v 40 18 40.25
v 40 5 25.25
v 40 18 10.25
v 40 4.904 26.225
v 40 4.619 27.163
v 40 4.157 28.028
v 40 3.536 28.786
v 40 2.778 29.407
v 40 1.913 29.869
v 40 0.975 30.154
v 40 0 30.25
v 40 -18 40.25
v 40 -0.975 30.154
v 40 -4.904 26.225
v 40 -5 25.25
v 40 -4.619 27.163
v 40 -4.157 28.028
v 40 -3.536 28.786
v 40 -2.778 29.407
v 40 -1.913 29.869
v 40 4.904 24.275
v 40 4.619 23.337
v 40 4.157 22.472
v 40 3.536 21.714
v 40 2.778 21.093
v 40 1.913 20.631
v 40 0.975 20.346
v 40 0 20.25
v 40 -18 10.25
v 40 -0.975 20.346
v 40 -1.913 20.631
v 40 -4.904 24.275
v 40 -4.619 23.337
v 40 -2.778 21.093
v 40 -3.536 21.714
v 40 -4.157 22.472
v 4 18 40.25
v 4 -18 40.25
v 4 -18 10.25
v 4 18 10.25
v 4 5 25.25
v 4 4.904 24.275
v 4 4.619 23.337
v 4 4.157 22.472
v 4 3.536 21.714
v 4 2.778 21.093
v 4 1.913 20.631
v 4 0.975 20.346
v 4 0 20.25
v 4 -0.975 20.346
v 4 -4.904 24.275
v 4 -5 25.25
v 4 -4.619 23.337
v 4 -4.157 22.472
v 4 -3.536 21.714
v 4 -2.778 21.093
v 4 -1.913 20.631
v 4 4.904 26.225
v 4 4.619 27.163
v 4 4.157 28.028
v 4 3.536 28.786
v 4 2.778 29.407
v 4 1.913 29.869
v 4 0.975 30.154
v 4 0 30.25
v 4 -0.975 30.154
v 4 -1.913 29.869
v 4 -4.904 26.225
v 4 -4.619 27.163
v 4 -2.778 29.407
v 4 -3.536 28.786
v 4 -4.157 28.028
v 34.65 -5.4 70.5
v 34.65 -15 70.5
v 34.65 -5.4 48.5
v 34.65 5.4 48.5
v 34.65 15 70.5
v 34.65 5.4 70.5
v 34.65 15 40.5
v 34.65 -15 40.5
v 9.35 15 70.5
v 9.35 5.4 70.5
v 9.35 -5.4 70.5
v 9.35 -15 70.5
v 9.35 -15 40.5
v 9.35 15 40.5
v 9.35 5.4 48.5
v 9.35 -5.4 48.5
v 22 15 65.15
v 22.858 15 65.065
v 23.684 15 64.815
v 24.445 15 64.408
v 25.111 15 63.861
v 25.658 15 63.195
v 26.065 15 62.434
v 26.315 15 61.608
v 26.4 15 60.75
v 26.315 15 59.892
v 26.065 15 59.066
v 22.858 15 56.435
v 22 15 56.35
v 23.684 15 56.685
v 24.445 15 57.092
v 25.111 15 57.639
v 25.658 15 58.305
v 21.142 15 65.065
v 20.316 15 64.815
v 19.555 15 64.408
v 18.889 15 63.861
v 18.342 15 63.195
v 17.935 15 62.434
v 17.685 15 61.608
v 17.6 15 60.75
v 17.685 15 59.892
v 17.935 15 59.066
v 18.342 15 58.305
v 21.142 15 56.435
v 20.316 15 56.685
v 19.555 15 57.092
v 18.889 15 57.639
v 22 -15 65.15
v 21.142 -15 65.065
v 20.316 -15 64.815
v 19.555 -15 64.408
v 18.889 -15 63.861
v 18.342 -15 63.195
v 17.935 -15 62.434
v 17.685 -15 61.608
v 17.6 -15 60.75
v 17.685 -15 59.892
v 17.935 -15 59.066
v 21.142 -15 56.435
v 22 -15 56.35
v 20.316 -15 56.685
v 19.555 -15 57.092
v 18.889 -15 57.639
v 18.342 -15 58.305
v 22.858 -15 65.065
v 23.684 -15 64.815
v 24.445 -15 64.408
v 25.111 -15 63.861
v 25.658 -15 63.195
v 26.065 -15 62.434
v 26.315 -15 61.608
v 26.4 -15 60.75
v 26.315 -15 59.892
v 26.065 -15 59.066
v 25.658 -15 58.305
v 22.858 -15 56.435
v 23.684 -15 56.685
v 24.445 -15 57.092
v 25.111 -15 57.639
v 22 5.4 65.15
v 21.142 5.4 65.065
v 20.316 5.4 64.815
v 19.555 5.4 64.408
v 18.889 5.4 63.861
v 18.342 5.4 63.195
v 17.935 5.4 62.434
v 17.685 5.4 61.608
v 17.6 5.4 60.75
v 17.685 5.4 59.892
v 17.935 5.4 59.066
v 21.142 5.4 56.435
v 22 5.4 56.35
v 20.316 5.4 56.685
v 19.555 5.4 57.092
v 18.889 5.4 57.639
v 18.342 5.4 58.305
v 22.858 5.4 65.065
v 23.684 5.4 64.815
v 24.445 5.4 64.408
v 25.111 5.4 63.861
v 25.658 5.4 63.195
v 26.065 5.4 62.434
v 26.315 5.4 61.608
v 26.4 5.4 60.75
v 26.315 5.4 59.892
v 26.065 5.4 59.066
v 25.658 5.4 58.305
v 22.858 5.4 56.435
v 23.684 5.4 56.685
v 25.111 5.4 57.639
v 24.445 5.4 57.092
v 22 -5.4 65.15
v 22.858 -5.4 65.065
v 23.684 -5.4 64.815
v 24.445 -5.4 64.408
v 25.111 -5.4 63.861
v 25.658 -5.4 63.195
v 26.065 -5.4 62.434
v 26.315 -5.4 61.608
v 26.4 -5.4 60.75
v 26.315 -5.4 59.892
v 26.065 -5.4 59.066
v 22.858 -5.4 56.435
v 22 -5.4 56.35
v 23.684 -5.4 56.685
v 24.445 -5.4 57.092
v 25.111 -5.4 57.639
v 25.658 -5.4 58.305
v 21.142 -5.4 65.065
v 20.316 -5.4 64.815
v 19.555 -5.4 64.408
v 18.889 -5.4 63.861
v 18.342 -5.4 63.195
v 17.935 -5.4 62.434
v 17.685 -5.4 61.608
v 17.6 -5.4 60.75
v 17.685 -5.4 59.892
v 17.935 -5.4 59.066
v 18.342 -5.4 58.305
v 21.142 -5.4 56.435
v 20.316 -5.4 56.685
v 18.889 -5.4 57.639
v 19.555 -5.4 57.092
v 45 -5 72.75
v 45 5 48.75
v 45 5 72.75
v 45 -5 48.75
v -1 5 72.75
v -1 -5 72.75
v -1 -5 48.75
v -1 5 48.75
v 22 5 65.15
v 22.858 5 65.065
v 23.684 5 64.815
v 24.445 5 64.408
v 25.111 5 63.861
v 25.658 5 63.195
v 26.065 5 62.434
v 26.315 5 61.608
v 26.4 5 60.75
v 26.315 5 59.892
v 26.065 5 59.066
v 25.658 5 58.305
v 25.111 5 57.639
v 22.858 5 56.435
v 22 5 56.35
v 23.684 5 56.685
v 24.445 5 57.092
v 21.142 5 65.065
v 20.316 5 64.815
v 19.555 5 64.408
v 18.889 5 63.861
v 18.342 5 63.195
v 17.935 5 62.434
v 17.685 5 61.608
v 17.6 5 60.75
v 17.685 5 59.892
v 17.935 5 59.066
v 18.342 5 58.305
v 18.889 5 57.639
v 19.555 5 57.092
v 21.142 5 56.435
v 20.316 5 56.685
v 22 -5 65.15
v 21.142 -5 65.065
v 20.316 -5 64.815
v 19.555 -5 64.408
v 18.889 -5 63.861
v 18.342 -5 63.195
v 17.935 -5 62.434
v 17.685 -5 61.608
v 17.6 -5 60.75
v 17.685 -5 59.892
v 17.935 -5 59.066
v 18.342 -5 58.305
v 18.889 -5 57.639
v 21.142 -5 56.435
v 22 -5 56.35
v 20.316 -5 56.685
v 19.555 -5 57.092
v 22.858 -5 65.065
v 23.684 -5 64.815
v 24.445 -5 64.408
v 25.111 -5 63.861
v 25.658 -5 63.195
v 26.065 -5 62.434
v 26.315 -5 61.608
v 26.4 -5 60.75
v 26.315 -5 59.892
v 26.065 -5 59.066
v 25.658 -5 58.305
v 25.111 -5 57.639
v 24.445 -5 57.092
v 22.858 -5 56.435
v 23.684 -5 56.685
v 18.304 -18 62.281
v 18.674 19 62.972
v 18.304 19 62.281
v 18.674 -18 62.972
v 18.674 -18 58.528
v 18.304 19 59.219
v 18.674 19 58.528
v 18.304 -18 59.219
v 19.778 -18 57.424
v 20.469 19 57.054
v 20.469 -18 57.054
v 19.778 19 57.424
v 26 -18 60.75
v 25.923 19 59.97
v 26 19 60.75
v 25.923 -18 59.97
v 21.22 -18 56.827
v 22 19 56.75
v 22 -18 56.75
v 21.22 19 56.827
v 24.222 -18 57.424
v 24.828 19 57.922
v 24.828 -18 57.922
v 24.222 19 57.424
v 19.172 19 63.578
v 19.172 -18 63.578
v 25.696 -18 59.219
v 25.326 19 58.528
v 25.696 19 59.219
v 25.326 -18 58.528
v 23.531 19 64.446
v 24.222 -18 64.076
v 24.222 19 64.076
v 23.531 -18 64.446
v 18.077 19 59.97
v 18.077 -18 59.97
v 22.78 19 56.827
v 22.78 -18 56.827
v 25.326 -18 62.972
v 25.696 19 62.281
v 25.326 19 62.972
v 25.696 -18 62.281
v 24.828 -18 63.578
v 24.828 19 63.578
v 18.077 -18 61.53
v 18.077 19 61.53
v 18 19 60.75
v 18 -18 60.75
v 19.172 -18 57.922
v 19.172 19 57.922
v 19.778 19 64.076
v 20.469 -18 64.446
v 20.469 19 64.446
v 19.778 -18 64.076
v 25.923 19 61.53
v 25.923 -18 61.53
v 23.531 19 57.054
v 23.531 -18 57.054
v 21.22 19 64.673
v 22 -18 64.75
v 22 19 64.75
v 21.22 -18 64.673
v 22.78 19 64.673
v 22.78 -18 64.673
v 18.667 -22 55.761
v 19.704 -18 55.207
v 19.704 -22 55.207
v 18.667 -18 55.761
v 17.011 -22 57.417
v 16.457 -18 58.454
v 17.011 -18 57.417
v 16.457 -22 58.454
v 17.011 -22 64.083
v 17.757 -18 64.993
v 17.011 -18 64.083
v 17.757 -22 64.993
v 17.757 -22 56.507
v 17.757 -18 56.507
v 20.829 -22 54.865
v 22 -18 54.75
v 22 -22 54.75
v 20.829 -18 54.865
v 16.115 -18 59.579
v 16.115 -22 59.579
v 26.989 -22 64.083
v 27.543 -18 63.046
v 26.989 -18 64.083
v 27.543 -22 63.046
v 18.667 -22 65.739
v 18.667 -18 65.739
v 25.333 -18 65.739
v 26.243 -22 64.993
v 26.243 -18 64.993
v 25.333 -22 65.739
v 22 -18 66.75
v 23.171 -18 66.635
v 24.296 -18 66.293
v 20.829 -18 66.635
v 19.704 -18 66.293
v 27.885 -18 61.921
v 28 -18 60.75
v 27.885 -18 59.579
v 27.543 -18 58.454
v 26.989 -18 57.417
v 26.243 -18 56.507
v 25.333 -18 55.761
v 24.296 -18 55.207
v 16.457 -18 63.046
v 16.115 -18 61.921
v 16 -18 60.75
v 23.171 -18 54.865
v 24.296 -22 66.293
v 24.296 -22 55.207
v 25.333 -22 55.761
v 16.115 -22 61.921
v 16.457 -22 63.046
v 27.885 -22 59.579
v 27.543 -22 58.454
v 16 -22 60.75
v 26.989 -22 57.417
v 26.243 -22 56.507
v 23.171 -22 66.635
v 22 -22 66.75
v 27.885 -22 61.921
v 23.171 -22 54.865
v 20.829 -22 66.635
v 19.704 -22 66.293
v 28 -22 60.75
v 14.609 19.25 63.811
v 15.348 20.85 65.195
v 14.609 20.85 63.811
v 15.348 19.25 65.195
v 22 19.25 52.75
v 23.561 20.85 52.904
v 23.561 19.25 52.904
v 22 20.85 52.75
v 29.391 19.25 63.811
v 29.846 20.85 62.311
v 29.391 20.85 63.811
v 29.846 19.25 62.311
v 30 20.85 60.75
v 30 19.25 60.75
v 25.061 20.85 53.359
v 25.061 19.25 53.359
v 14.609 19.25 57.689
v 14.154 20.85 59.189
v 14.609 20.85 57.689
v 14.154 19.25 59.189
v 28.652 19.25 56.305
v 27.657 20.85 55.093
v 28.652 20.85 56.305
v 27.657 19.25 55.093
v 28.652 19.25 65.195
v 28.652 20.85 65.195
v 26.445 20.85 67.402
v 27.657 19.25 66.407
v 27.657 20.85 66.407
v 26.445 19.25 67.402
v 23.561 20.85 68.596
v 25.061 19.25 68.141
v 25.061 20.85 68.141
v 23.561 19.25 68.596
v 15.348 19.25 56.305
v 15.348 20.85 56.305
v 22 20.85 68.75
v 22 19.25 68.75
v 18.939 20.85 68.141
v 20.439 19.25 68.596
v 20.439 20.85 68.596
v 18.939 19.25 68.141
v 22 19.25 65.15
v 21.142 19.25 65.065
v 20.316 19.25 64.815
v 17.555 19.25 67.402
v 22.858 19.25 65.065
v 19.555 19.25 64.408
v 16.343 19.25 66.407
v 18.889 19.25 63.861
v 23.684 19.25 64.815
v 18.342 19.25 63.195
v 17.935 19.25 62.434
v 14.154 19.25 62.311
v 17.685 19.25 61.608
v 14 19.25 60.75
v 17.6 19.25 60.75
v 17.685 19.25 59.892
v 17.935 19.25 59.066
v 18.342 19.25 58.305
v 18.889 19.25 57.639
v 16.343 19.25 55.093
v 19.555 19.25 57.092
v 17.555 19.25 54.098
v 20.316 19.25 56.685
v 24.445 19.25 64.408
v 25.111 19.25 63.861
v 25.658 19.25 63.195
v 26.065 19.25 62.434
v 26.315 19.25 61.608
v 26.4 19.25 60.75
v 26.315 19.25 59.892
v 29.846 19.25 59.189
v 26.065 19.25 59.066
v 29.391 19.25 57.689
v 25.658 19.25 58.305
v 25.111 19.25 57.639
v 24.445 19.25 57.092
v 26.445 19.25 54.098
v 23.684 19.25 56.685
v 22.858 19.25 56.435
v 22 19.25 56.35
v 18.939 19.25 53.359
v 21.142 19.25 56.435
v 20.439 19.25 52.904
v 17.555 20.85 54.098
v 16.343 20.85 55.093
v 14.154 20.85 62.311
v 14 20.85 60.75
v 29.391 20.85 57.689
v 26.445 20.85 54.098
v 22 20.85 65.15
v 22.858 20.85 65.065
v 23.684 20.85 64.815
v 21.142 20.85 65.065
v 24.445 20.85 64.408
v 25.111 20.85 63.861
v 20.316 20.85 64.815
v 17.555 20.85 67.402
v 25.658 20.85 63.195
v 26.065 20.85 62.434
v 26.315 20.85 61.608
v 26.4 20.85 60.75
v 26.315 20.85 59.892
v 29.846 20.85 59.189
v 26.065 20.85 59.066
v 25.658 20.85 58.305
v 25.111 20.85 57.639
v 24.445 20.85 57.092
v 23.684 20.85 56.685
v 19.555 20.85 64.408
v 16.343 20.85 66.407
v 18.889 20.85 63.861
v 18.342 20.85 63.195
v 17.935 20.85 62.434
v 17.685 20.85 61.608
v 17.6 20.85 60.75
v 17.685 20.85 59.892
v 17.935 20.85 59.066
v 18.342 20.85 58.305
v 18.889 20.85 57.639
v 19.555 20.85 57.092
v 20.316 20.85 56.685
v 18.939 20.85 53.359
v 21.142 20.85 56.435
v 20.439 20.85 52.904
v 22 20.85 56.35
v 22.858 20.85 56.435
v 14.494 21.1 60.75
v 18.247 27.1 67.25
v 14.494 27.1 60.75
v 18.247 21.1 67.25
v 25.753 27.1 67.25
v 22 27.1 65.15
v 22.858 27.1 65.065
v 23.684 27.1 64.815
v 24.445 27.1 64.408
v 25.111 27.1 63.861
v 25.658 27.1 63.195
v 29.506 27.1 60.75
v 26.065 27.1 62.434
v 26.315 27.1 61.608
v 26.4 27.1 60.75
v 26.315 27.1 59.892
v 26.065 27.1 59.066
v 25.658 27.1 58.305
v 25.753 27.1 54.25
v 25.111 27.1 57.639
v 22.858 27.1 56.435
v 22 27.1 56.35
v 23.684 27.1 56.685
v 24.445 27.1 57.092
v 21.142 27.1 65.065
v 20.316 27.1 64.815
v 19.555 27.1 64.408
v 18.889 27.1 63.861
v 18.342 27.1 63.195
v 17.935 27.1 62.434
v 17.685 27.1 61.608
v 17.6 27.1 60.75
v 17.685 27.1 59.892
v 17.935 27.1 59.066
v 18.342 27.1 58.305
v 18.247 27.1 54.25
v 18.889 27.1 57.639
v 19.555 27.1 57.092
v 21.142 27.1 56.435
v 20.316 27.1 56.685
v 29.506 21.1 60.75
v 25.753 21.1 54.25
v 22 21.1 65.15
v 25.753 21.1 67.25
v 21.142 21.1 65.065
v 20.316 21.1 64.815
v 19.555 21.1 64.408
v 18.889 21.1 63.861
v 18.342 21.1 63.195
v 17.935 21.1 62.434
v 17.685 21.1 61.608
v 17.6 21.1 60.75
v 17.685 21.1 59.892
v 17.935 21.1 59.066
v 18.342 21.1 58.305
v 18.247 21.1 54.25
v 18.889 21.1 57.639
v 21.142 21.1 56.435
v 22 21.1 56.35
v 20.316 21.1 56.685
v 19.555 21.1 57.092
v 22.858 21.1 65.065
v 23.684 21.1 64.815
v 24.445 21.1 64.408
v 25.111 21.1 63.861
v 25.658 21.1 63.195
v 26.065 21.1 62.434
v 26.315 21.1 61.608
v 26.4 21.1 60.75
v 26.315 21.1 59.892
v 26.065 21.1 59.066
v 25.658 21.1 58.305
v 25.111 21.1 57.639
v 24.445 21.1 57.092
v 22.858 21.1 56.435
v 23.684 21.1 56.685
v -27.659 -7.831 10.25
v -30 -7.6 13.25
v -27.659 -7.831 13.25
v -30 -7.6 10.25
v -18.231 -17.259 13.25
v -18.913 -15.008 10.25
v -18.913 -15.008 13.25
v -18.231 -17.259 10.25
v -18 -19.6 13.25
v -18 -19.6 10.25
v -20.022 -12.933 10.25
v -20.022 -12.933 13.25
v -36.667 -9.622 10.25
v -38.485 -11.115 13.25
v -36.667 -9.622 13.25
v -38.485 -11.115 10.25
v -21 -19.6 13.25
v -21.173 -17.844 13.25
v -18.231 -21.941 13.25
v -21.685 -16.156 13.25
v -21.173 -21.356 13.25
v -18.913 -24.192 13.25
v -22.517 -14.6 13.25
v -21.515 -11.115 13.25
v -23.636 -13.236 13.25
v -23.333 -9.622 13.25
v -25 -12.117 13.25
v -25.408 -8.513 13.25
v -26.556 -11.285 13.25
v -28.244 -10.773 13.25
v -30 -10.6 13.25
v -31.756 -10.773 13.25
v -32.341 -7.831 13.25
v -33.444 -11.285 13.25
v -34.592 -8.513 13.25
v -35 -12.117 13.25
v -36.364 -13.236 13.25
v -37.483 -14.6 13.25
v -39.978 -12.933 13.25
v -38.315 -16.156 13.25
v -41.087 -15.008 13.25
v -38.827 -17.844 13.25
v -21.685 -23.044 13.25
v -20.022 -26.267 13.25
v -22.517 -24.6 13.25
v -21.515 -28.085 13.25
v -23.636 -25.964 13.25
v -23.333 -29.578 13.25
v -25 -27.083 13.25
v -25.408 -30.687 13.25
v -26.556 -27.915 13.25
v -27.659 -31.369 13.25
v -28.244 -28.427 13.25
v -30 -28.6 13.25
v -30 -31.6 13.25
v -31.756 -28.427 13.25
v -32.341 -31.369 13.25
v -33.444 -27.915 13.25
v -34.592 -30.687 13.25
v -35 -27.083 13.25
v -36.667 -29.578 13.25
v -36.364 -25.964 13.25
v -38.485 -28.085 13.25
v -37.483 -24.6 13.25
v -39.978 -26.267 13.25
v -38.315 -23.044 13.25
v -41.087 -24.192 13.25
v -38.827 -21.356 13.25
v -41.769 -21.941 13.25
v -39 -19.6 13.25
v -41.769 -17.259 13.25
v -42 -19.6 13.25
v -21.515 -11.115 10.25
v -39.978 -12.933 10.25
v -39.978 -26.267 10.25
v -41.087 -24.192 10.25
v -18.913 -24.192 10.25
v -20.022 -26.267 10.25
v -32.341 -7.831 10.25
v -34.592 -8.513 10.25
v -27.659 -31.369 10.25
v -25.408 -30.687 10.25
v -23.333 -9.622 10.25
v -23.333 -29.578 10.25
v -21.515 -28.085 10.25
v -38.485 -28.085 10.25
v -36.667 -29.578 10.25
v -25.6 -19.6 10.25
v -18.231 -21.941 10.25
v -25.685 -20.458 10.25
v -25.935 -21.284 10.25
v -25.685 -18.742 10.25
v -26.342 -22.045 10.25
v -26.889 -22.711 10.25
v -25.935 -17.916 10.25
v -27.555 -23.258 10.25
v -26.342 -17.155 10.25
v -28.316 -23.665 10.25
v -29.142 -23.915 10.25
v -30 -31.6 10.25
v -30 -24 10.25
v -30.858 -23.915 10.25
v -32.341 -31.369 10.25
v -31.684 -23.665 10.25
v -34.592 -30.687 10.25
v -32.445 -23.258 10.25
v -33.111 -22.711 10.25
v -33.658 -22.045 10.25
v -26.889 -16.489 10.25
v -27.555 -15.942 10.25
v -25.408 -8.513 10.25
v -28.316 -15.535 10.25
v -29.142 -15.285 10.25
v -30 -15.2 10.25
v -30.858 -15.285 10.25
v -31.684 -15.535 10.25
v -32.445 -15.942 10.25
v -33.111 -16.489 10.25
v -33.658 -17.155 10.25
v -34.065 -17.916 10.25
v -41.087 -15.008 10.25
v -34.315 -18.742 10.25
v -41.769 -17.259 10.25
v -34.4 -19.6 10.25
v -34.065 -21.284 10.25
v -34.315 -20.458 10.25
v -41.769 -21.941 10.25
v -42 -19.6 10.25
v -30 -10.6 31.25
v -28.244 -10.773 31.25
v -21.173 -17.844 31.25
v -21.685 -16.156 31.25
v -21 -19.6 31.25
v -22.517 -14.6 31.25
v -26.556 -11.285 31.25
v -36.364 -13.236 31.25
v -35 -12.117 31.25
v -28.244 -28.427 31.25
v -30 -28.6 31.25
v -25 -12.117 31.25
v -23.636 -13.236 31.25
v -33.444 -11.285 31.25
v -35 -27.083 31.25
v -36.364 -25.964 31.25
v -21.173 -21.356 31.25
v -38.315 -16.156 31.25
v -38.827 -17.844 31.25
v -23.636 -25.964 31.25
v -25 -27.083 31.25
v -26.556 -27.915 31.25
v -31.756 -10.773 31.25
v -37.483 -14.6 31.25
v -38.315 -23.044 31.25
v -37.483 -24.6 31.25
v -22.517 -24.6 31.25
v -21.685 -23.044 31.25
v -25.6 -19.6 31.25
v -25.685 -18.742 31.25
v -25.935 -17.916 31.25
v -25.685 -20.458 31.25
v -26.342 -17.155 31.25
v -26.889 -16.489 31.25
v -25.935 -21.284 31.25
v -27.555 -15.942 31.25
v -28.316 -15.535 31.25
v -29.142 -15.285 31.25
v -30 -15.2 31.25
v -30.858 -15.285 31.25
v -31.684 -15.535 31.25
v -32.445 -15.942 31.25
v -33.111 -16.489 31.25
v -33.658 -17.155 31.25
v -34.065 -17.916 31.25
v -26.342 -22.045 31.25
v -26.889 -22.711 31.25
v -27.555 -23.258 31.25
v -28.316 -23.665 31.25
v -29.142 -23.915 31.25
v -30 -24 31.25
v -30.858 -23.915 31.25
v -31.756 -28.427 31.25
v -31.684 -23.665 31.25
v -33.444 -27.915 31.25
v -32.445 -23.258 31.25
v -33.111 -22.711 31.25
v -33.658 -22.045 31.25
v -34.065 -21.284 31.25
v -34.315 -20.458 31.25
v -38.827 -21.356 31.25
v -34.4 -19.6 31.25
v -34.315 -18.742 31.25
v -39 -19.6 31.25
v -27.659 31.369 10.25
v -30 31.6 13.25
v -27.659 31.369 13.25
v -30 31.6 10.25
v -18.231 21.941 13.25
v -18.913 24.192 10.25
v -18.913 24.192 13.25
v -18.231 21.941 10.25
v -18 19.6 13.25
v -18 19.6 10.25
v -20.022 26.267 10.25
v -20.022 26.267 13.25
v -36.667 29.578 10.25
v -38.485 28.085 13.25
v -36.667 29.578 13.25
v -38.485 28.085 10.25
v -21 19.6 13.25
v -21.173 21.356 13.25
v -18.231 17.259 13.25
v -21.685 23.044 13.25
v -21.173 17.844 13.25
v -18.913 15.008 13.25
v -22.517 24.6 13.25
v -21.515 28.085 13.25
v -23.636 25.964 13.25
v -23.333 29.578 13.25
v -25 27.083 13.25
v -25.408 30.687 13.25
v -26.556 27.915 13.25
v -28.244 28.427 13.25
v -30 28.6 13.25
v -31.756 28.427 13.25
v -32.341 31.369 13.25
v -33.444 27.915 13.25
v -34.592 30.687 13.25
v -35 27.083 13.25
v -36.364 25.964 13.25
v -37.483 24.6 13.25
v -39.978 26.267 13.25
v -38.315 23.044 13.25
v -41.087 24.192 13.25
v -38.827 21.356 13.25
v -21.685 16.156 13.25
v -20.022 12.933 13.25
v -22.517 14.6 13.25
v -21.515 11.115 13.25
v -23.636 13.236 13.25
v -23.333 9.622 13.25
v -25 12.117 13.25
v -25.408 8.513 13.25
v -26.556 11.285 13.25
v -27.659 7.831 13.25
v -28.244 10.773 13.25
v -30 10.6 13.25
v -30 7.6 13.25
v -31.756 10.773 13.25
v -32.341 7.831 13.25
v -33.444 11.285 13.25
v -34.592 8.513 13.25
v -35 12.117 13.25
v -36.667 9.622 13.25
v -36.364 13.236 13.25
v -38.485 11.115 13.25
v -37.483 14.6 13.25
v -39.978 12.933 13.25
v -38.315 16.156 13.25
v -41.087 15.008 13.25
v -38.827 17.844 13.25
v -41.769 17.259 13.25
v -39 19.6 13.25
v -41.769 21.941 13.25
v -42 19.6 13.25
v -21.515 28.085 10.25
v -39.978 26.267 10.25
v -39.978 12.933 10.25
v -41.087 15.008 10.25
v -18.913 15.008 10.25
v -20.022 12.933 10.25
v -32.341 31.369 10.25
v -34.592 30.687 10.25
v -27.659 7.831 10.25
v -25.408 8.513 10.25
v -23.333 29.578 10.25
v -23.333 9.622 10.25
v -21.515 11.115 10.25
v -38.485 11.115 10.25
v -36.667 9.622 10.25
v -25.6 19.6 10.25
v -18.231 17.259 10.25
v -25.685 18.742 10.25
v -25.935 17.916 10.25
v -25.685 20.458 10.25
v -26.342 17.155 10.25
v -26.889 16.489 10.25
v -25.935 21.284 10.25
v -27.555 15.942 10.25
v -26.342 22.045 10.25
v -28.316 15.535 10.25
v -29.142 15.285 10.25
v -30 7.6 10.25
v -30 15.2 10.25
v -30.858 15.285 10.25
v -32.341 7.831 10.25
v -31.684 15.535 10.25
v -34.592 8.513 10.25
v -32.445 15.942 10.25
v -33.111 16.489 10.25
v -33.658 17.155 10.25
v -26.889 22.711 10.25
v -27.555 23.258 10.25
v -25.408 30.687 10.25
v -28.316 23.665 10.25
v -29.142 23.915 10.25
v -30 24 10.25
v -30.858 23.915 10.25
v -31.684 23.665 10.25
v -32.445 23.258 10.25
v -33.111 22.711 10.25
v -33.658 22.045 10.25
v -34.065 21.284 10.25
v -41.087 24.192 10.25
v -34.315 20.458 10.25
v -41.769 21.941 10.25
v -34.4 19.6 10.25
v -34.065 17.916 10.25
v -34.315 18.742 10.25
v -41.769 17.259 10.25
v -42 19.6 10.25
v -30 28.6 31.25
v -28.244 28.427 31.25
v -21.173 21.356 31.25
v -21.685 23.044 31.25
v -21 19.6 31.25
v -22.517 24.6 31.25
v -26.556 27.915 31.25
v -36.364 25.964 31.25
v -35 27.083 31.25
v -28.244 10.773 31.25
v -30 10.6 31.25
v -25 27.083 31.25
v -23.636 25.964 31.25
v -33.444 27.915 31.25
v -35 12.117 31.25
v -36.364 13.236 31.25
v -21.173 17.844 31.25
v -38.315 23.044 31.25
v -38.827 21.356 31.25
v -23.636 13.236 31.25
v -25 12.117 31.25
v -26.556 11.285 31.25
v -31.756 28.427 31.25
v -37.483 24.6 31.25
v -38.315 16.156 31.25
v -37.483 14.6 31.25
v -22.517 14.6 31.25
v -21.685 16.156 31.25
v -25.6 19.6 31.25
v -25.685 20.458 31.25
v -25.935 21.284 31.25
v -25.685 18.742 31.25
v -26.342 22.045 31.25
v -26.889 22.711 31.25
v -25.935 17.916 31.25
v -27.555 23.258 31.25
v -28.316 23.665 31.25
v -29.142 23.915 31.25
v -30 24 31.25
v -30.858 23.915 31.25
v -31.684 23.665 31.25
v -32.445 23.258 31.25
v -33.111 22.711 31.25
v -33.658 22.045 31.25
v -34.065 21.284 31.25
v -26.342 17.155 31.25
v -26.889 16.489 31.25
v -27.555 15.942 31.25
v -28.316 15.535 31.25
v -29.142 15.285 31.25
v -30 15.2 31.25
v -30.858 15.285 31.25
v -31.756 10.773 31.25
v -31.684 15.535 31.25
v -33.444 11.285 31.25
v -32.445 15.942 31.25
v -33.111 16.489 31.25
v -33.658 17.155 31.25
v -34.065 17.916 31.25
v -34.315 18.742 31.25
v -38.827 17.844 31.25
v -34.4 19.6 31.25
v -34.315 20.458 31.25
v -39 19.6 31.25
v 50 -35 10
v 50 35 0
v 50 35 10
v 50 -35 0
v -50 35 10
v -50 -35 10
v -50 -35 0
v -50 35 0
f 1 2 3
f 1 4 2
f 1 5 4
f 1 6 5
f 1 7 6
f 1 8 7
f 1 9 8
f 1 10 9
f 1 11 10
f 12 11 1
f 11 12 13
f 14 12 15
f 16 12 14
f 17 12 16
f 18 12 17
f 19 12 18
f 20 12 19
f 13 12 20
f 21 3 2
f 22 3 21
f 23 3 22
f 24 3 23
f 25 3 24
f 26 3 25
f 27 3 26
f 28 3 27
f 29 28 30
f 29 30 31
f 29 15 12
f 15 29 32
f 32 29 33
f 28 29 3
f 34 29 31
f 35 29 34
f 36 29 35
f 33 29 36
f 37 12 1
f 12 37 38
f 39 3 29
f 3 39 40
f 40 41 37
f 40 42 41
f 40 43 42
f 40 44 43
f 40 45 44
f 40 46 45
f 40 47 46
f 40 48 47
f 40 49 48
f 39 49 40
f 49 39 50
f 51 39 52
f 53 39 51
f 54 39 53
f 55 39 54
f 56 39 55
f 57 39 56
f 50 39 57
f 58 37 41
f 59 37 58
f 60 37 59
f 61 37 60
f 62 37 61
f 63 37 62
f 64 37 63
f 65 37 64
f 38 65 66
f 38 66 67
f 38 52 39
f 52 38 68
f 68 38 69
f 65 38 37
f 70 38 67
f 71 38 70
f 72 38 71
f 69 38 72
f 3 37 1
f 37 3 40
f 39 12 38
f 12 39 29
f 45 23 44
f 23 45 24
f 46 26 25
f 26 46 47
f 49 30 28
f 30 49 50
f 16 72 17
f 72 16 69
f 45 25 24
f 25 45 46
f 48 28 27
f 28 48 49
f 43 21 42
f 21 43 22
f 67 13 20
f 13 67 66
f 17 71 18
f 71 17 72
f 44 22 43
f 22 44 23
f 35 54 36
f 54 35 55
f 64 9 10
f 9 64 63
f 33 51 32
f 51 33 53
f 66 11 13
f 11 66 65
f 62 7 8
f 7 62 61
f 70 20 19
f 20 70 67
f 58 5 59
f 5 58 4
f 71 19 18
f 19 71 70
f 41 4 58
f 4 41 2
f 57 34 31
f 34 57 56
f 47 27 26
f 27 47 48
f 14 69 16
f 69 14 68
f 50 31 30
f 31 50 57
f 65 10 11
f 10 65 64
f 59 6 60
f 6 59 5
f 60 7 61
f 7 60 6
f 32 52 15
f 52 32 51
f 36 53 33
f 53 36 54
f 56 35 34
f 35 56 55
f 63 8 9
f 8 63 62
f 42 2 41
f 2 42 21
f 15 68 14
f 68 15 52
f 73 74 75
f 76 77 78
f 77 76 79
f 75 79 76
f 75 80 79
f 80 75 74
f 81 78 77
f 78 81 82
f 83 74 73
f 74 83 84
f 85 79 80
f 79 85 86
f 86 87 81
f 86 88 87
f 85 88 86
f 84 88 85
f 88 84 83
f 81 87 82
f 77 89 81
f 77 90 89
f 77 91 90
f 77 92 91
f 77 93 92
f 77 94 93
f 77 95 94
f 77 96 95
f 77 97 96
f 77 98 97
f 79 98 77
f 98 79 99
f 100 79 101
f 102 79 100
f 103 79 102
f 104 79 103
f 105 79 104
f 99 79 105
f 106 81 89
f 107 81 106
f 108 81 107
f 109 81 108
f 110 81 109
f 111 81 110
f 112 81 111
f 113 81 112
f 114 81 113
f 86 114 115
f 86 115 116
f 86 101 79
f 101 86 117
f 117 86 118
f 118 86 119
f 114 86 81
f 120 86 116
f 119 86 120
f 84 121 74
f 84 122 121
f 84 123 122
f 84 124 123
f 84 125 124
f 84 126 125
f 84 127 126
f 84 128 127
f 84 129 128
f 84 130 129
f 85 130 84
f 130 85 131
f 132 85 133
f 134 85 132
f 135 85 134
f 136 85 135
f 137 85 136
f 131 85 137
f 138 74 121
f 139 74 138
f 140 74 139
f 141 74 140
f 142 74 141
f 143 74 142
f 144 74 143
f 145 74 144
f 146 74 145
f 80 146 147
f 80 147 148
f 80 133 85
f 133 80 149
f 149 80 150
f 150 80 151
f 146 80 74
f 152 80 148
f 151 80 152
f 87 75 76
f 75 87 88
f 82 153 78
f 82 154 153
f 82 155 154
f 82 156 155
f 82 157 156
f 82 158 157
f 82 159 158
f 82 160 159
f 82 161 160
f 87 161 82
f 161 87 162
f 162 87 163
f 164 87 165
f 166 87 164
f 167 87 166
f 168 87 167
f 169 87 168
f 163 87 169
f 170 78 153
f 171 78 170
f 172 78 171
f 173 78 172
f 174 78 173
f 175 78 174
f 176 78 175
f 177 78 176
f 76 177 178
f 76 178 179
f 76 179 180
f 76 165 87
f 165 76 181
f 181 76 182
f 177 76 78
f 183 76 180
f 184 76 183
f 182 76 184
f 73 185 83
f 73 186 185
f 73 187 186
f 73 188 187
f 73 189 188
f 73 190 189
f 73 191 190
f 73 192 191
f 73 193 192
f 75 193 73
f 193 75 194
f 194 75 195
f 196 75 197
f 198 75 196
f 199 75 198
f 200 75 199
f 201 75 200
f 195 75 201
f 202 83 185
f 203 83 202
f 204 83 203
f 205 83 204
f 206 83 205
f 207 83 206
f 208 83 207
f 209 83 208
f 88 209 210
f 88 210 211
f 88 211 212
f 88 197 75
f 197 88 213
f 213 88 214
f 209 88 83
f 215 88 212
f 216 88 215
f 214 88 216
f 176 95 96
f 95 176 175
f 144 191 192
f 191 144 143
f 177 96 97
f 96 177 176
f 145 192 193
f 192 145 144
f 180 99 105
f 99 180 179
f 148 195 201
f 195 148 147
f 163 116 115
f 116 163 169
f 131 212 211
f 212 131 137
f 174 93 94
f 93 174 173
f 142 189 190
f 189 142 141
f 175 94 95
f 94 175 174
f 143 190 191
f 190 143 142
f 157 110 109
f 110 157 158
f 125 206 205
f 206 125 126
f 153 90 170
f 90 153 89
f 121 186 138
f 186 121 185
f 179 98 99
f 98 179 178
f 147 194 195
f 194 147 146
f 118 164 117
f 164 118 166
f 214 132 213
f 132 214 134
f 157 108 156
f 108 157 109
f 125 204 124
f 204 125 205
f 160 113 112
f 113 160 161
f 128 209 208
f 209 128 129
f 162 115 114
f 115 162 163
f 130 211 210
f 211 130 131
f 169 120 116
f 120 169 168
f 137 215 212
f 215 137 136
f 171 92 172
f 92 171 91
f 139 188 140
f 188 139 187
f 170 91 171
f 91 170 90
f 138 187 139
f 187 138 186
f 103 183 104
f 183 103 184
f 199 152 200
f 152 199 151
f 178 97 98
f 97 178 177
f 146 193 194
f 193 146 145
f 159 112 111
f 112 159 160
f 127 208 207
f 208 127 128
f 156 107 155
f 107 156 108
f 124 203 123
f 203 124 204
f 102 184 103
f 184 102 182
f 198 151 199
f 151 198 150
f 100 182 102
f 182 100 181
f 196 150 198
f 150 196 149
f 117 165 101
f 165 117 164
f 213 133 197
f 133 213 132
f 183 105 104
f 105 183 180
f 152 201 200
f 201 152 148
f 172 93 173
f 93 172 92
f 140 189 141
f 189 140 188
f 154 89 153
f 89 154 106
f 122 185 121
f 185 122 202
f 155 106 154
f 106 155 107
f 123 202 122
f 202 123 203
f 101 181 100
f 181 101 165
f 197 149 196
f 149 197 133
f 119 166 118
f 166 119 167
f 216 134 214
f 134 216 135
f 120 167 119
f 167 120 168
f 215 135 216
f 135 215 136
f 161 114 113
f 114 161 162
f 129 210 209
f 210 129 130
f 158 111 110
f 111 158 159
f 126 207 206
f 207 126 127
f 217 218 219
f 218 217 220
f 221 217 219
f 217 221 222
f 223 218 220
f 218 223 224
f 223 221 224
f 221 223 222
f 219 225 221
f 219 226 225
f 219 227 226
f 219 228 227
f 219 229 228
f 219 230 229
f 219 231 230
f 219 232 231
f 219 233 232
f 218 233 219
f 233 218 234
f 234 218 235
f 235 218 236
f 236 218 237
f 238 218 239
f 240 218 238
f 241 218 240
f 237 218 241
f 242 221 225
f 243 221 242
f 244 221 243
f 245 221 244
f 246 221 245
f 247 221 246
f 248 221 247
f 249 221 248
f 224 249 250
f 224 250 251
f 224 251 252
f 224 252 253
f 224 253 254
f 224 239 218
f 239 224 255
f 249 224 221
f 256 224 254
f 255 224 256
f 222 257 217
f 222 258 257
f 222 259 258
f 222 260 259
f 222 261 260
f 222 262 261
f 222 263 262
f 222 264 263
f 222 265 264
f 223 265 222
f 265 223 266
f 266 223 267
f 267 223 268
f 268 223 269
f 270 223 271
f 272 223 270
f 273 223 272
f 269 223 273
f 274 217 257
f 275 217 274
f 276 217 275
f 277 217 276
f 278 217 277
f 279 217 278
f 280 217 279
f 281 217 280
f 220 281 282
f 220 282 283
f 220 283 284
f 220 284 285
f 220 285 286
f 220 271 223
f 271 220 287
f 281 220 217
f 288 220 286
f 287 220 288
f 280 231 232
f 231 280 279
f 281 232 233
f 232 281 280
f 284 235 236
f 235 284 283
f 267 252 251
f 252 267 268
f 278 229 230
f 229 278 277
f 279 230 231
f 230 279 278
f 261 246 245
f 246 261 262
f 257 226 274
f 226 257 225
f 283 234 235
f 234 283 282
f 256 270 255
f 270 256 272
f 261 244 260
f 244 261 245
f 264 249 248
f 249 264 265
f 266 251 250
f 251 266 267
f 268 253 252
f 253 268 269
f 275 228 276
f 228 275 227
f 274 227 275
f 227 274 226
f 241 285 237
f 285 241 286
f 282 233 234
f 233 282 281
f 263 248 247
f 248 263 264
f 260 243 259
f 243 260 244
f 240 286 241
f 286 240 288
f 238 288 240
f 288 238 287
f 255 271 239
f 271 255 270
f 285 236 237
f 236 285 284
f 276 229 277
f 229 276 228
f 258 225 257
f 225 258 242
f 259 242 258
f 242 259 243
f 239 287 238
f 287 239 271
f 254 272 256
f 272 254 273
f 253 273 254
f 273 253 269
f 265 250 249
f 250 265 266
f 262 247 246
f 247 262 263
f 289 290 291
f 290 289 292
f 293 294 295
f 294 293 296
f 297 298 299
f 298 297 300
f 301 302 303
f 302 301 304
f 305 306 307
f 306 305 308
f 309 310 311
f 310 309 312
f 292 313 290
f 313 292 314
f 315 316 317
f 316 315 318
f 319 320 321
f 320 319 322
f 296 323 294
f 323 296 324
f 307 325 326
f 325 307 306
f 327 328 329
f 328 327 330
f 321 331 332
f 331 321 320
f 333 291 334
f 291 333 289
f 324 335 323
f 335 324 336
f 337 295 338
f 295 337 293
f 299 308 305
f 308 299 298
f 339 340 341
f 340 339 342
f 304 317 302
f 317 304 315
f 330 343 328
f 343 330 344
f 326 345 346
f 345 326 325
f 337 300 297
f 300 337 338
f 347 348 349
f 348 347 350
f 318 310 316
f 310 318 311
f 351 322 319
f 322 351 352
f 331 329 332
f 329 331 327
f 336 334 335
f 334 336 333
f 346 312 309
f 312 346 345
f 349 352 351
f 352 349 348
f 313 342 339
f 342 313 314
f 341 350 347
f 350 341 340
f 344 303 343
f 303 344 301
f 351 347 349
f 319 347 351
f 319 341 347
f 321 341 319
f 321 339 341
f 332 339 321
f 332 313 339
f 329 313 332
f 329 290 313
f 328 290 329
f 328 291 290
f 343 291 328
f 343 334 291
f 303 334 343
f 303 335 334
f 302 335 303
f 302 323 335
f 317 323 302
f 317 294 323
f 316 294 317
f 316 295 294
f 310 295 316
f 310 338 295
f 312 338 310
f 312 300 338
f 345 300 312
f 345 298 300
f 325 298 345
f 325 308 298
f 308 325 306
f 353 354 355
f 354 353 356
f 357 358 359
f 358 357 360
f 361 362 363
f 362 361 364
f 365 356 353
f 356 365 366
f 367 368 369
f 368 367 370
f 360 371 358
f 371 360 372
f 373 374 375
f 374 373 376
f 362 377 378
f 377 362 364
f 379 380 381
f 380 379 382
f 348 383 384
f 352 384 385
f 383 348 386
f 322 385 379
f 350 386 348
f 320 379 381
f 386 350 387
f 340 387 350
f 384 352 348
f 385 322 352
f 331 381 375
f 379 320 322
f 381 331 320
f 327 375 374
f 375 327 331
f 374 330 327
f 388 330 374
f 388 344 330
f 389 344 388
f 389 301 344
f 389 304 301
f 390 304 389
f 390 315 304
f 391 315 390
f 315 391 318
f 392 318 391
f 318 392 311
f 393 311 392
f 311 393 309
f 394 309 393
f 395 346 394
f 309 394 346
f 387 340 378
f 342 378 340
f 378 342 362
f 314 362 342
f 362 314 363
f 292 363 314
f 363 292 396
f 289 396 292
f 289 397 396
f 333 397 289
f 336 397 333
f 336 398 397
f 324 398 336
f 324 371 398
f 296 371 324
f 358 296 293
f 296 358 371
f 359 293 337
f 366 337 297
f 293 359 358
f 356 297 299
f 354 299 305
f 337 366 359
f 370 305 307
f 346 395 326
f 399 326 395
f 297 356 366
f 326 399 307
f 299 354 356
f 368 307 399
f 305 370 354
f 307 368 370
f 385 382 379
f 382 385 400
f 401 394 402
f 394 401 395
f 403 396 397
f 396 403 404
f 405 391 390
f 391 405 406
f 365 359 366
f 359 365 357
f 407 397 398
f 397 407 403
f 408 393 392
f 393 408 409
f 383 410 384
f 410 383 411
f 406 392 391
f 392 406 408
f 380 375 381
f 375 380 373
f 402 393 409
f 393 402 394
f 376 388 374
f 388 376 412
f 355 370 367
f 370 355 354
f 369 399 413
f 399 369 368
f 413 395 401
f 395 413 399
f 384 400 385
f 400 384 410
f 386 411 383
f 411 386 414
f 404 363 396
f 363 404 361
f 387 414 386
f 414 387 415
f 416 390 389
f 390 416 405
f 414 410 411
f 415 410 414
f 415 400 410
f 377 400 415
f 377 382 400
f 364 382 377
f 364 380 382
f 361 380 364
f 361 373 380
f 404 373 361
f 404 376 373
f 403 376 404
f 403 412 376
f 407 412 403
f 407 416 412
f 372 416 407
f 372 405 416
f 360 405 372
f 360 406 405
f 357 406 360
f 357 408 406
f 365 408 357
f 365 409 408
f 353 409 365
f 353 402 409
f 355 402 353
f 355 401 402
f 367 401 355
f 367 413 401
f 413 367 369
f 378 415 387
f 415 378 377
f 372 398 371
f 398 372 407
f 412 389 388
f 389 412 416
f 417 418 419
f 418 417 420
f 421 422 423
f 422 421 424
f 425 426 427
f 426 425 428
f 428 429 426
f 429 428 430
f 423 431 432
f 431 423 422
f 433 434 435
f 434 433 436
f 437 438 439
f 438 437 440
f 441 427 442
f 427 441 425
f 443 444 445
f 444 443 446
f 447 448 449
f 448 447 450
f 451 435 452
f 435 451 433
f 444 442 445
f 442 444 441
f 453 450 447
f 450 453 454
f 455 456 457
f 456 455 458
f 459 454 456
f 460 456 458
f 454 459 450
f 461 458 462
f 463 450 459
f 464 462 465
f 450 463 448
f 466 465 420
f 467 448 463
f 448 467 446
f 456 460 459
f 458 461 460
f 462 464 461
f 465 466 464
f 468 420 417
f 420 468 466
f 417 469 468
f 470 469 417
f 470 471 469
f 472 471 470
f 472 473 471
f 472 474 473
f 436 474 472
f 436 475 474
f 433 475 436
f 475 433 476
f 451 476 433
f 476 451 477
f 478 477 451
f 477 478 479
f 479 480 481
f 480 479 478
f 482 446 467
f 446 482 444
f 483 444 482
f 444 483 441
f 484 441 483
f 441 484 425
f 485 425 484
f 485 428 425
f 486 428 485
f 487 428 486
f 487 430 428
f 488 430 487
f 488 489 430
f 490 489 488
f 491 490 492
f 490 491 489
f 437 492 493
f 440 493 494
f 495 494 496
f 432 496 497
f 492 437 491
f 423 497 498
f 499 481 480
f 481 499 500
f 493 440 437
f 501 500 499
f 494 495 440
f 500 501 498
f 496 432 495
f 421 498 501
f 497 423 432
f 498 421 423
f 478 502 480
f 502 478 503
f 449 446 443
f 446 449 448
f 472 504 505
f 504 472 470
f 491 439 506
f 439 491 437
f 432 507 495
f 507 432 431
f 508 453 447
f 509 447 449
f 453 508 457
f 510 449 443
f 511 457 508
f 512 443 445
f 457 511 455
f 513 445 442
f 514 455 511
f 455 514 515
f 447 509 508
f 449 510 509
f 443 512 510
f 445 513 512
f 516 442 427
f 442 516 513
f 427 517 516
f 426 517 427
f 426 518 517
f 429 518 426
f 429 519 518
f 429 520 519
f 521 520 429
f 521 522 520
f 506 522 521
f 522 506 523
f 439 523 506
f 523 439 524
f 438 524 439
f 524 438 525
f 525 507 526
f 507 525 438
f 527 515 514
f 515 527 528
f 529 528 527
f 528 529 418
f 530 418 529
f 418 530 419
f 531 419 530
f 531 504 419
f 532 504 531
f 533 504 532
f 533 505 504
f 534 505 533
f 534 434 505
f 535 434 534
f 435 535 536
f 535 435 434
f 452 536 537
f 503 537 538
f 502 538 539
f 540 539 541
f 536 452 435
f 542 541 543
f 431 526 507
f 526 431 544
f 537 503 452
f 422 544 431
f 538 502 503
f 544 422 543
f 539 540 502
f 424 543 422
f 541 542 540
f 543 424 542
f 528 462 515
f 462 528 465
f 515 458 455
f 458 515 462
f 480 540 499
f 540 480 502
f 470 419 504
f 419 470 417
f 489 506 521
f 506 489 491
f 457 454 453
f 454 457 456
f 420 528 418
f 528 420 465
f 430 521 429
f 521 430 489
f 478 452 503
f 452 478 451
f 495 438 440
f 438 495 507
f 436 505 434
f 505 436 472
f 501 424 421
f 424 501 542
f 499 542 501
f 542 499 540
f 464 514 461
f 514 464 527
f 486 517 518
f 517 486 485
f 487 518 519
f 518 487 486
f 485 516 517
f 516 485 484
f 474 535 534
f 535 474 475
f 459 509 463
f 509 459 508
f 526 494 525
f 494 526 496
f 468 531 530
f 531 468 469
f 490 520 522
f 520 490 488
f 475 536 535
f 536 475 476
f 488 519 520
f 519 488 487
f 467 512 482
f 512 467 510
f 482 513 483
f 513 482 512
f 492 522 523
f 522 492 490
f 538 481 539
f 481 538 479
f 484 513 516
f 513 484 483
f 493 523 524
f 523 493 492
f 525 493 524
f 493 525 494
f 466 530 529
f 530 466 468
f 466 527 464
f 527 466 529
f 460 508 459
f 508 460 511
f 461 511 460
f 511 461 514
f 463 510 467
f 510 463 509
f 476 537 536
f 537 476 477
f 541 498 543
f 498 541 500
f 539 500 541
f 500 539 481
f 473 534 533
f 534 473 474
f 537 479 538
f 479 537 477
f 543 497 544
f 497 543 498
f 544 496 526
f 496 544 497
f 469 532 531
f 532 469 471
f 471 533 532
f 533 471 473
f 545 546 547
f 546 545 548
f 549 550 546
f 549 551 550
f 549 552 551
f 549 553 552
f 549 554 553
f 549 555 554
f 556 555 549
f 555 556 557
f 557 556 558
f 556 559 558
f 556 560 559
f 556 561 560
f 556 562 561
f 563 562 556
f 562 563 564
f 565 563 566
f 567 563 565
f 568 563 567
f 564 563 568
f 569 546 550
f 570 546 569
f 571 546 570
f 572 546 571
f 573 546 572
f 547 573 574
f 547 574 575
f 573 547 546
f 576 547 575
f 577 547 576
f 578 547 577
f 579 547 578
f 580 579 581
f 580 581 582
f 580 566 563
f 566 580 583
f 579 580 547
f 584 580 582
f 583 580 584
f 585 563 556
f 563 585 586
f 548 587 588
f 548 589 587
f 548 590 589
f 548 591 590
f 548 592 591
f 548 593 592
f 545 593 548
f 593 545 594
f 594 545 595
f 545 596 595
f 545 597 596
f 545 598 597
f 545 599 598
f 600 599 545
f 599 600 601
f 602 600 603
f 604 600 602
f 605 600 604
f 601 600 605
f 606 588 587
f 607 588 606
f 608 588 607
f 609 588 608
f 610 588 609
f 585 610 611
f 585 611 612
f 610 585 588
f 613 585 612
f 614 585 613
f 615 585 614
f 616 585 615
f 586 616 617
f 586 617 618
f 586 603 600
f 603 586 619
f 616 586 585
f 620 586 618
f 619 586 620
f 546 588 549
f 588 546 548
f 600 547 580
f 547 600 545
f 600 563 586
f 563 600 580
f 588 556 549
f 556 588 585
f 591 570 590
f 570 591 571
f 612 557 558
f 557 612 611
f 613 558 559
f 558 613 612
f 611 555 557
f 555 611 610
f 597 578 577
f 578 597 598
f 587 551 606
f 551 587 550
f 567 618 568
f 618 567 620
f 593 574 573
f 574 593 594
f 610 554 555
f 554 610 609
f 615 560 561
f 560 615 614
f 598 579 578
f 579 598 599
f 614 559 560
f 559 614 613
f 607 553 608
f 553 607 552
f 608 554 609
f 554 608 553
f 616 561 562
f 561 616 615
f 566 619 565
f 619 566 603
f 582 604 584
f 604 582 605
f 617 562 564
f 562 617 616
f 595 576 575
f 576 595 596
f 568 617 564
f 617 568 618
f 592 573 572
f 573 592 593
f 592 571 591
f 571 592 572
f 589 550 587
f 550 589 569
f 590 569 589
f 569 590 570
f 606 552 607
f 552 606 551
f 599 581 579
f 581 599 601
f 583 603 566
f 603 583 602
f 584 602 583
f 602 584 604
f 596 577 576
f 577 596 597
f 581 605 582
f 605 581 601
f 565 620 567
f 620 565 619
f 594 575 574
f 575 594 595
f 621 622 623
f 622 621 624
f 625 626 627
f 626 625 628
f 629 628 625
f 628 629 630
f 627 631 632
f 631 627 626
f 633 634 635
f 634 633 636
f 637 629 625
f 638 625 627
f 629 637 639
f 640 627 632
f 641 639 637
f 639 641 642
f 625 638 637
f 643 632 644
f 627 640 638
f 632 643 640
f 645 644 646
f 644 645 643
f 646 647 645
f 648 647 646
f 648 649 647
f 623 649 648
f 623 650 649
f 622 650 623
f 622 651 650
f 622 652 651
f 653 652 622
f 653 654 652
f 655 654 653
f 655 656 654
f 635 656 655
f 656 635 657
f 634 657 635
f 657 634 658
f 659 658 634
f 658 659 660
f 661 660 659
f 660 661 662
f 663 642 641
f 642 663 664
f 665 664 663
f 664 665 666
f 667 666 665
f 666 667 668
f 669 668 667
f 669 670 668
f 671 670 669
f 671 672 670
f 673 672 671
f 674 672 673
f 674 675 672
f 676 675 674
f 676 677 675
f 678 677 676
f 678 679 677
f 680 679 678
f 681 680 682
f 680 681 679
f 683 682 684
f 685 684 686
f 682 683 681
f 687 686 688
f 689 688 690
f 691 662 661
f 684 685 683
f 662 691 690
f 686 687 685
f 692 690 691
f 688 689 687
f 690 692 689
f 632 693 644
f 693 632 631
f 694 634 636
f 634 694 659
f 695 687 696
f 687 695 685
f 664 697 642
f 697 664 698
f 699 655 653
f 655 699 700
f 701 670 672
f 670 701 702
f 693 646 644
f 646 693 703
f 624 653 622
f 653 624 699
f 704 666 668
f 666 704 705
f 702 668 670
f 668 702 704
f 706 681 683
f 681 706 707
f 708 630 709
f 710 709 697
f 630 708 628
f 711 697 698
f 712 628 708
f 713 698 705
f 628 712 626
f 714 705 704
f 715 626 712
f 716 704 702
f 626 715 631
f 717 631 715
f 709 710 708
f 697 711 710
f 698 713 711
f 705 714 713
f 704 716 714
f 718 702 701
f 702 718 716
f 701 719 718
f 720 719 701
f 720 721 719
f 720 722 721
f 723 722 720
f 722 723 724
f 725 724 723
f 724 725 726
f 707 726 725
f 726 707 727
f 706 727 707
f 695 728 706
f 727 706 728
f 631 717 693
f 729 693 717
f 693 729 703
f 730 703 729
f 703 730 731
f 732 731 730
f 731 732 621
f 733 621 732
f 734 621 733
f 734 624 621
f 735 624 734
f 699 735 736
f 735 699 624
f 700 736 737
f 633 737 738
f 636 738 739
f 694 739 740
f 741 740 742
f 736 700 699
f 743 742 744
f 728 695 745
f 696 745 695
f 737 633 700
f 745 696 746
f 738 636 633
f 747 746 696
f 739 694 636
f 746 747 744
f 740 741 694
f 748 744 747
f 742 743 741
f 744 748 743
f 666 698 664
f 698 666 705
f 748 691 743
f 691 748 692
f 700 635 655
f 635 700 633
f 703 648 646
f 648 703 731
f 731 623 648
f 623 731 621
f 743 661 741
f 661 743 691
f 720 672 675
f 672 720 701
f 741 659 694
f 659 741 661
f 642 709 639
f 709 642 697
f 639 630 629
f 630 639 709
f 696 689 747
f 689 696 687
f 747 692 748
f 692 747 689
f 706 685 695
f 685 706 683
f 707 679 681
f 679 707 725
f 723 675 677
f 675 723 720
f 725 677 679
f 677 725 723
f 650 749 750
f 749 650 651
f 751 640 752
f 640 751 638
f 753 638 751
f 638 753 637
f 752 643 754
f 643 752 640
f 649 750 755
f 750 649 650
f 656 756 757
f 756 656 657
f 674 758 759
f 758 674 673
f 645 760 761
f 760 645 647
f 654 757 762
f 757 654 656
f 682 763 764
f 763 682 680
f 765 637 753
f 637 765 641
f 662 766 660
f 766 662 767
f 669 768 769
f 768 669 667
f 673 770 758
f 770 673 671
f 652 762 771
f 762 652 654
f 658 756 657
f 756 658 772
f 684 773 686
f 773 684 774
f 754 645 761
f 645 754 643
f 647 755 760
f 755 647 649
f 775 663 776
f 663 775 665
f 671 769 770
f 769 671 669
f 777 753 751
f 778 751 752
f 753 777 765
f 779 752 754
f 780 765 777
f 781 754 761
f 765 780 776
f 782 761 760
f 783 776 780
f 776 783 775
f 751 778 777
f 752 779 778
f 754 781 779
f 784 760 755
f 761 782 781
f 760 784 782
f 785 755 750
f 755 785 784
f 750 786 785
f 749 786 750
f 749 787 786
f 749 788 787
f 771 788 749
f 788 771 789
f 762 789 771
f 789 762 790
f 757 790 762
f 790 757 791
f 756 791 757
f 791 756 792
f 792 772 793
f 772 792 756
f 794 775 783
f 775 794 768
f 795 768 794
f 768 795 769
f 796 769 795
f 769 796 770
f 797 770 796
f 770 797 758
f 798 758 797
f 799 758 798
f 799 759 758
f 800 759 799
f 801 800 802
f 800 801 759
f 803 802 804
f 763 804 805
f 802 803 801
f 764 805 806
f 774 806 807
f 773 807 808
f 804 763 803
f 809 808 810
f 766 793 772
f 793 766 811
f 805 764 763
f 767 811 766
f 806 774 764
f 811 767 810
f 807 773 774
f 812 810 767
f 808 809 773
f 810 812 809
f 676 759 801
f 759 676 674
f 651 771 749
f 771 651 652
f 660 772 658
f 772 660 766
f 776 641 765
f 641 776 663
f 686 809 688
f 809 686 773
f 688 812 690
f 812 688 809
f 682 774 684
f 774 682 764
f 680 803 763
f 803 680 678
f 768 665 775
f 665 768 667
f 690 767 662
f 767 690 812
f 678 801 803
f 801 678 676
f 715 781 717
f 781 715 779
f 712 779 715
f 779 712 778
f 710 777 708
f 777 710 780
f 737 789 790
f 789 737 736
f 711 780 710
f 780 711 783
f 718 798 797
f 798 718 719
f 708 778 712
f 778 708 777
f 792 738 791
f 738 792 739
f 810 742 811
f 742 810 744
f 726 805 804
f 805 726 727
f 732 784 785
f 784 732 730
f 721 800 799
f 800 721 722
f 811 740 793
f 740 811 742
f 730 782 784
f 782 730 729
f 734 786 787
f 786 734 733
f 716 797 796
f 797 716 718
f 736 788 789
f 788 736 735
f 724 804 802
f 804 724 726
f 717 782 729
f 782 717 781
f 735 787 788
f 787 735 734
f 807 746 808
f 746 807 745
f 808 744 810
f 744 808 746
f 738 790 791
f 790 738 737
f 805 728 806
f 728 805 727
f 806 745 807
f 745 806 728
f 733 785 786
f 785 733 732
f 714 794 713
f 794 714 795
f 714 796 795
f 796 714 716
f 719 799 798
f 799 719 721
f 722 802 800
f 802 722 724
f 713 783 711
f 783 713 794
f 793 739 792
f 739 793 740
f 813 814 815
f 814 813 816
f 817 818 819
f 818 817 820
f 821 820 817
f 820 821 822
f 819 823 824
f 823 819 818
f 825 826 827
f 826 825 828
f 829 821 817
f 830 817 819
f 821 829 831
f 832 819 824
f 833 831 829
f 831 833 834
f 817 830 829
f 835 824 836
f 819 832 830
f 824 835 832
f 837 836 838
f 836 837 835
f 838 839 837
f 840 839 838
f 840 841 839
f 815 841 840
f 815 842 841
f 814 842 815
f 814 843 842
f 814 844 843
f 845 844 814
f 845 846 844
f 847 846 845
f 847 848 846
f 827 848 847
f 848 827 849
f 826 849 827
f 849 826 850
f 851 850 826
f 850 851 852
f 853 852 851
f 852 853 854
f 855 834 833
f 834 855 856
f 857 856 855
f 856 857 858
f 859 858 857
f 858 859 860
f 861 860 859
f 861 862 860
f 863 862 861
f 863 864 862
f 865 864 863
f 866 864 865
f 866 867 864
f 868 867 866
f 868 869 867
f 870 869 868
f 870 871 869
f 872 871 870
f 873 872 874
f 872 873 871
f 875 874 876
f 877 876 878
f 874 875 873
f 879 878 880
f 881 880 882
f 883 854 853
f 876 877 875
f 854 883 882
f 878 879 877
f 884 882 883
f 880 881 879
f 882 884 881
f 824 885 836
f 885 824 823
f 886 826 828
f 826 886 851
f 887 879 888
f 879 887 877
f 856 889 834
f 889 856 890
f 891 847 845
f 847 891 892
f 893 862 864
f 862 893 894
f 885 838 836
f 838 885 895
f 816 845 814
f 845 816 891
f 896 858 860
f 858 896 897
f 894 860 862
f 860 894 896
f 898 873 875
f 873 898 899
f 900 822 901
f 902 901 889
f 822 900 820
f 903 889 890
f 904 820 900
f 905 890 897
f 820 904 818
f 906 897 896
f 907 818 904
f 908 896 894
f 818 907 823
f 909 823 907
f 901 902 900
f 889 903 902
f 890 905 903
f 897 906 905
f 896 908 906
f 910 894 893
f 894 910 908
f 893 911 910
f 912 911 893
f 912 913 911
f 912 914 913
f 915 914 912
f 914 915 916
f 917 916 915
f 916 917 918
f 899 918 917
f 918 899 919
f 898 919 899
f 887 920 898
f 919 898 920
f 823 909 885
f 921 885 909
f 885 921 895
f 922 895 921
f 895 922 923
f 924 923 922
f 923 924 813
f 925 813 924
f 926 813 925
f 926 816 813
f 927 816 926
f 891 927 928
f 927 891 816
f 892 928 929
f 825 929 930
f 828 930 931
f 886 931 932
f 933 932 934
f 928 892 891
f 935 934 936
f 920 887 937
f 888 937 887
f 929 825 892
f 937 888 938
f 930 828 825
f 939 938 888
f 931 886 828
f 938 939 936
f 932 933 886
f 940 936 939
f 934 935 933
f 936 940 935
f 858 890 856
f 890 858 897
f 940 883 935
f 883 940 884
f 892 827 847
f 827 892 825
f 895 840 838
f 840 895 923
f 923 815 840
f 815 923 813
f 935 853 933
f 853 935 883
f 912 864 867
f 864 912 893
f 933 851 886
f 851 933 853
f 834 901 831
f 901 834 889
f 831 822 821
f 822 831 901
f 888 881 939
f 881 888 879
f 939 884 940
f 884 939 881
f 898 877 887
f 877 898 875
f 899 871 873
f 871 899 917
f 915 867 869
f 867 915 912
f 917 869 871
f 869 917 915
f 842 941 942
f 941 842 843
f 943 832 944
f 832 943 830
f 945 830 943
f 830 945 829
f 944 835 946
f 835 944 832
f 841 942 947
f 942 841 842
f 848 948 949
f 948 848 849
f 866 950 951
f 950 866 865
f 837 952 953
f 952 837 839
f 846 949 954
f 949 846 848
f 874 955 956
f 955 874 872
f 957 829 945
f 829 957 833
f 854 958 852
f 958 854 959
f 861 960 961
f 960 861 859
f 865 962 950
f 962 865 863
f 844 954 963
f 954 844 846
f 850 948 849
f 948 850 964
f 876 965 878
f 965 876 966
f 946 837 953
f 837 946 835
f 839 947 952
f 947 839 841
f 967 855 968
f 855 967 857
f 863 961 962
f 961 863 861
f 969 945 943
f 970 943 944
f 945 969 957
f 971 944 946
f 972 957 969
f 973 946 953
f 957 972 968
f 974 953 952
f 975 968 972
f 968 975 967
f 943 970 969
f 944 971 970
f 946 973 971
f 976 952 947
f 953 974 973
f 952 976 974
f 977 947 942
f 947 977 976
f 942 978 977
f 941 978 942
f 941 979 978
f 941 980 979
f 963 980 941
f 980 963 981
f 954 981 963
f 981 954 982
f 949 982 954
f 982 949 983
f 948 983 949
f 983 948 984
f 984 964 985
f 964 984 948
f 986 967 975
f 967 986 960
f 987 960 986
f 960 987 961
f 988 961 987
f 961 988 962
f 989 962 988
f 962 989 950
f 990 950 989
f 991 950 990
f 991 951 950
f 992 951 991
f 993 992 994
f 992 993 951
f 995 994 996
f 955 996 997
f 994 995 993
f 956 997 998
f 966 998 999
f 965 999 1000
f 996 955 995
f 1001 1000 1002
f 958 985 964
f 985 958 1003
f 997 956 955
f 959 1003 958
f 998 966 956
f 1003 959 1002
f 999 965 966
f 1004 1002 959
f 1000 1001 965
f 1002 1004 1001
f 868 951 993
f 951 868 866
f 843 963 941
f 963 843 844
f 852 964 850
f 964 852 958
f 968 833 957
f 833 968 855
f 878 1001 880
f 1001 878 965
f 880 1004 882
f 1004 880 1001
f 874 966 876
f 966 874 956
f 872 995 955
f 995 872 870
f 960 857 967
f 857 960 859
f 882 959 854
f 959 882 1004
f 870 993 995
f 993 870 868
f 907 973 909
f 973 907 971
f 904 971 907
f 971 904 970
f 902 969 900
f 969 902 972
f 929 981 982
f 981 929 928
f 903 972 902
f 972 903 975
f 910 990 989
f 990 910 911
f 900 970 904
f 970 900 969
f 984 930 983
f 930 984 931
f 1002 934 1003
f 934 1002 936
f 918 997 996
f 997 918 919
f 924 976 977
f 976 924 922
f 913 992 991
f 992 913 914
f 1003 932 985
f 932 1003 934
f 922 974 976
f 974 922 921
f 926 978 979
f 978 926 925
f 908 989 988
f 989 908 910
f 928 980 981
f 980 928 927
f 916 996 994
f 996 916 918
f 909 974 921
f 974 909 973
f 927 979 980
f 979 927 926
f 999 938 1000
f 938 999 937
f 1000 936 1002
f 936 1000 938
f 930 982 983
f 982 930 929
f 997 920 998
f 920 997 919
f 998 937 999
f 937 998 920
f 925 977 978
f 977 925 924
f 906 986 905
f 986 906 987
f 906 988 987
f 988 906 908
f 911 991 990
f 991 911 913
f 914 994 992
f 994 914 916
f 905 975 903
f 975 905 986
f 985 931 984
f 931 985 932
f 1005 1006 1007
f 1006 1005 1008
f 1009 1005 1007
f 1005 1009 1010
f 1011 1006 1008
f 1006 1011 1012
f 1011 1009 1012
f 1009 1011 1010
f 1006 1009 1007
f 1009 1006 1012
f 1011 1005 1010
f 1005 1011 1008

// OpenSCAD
$fn = 32;

// ------------------------------------------------------------------------
// Indexing jig: plate 100 x 70 mm, pin d8
// Every part is its own module, assembly() places every instance.
// ------------------------------------------------------------------------

// --- part 1 ---
module jig_plate() {
  difference() {
    translate([-50, -35, 0]) cube([100, 70, 10]);
  }
}

// --- part 2 ---
module locator_block() {
  difference() {
    translate([-18, -18, 0]) cube([36, 36, 30]);
    translate([0, 0, 15]) rotate([0, 90, 0]) cylinder(h = 38, d = 10, center = true);
  }
}

// --- part 3 ---
module index_fork() {
  difference() {
    translate([-12.65, -15, 0]) cube([25.3, 30, 30]);
    translate([-13.65, -5.4, 8]) cube([27.3, 10.8, 23]);
    translate([0, 0, 20.25]) rotate([90, 0, 0]) cylinder(h = 32, d = 8.8, center = true);
  }
}

// --- part 4 ---
module index_arm() {
  difference() {
    translate([-23, -5, 0]) cube([46, 10, 24]);
    translate([0, 0, 12]) rotate([90, 0, 0]) cylinder(h = 12, d = 8.8, center = true);
  }
}

// --- part 5 ---
module index_pin() {
  rotate([0, 90, 0]) cylinder(h = 38, d = 8, center = true);
  translate([-22, 0, 0]) rotate([0, 90, 0]) cylinder(h = 4, d = 12);
}

// --- part 6 ---
module pin_washer() {
  difference() {
      translate([0, 0, 0]) cylinder(h = 1.6, d = 16);
      translate([0, 0, -1]) cylinder(h = 3.6, d = 8.8);
    }
}

// --- part 7 ---
module lock_nut() {
  difference() {
    linear_extrude(height = 6) polygon(points = [[7.506, 0], [3.753, 6.5], [-3.753, 6.5], [-7.506, 0], [-3.753, -6.5], [3.753, -6.5]]);
    translate([0, 0, -1]) cylinder(h = 8, d = 8.8);
  }
}

// --- part 8 ---
module guide_bush_a() {
  difference() {
    union() {
      cylinder(h = 3, d = 24);
      translate([0, 0, 3]) cylinder(h = 18, d = 18);
    }
    translate([0, 0, -1]) cylinder(h = 23, d = 8.8);
  }
}

// --- part 9 ---
module guide_bush_b() {
  difference() {
    union() {
      cylinder(h = 3, d = 24);
      translate([0, 0, 3]) cylinder(h = 18, d = 18);
    }
    translate([0, 0, -1]) cylinder(h = 23, d = 8.8);
  }
}

// --- assembly ---
module assembly() {
  color([0.80, 0.24, 0.20]) translate([0, 0, 0]) rotate([0, 0, 0]) jig_plate();
  color([0.20, 0.45, 0.75]) translate([22, 0, 10.25]) rotate([0, 0, 0]) locator_block();
  color([0.25, 0.62, 0.32]) translate([22, 0, 40.5]) rotate([0, 0, 0]) index_fork();
  color([0.92, 0.70, 0.18]) translate([22, 0, 48.75]) rotate([0, 0, 0]) index_arm();
  color([0.58, 0.35, 0.70]) translate([22, 0, 60.75]) rotate([0, 0, 90]) index_pin();
  color([0.16, 0.66, 0.66]) translate([22, 20.85, 60.75]) rotate([90, 0, 0]) pin_washer();
  color([0.85, 0.48, 0.18]) translate([22, 27.1, 60.75]) rotate([90, 0, 0]) lock_nut();
  color([0.55, 0.60, 0.65]) translate([-30, -19.6, 10.25]) rotate([0, 0, 0]) guide_bush_a();
  color([0.75, 0.30, 0.55]) translate([-30, 19.6, 10.25]) rotate([0, 0, 0]) guide_bush_b();
}

assembly();
